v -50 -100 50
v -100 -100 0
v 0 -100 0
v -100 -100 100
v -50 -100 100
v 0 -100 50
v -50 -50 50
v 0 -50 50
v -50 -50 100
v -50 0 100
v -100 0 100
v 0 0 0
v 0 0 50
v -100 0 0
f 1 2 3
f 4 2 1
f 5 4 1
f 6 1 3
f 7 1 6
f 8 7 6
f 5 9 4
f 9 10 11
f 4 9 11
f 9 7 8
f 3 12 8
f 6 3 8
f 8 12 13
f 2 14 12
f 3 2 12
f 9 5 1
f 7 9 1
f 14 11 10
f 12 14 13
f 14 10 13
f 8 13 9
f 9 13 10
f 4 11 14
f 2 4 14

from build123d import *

# Parameters (mm, degrees)
F1_DEPTH = 100
F3_DEPTH = 50


with BuildPart() as f1:
    # F0 (on Front) → F1 (new body)
    with BuildSketch(Plane.XZ):
        Polygon((-50, 100), (-100, 100), (-100, 0), (0, 0), (0, 50), align=None)
    extrude(amount=F1_DEPTH)

    # F2 (on face) → F3 (cut)
    with BuildSketch(Plane.XZ.offset(100)):
        Polygon((0, 50), (-50, 100), (-50, 50), align=None)
    extrude(amount=-F3_DEPTH, mode=Mode.SUBTRACT)


solid = f1.part
